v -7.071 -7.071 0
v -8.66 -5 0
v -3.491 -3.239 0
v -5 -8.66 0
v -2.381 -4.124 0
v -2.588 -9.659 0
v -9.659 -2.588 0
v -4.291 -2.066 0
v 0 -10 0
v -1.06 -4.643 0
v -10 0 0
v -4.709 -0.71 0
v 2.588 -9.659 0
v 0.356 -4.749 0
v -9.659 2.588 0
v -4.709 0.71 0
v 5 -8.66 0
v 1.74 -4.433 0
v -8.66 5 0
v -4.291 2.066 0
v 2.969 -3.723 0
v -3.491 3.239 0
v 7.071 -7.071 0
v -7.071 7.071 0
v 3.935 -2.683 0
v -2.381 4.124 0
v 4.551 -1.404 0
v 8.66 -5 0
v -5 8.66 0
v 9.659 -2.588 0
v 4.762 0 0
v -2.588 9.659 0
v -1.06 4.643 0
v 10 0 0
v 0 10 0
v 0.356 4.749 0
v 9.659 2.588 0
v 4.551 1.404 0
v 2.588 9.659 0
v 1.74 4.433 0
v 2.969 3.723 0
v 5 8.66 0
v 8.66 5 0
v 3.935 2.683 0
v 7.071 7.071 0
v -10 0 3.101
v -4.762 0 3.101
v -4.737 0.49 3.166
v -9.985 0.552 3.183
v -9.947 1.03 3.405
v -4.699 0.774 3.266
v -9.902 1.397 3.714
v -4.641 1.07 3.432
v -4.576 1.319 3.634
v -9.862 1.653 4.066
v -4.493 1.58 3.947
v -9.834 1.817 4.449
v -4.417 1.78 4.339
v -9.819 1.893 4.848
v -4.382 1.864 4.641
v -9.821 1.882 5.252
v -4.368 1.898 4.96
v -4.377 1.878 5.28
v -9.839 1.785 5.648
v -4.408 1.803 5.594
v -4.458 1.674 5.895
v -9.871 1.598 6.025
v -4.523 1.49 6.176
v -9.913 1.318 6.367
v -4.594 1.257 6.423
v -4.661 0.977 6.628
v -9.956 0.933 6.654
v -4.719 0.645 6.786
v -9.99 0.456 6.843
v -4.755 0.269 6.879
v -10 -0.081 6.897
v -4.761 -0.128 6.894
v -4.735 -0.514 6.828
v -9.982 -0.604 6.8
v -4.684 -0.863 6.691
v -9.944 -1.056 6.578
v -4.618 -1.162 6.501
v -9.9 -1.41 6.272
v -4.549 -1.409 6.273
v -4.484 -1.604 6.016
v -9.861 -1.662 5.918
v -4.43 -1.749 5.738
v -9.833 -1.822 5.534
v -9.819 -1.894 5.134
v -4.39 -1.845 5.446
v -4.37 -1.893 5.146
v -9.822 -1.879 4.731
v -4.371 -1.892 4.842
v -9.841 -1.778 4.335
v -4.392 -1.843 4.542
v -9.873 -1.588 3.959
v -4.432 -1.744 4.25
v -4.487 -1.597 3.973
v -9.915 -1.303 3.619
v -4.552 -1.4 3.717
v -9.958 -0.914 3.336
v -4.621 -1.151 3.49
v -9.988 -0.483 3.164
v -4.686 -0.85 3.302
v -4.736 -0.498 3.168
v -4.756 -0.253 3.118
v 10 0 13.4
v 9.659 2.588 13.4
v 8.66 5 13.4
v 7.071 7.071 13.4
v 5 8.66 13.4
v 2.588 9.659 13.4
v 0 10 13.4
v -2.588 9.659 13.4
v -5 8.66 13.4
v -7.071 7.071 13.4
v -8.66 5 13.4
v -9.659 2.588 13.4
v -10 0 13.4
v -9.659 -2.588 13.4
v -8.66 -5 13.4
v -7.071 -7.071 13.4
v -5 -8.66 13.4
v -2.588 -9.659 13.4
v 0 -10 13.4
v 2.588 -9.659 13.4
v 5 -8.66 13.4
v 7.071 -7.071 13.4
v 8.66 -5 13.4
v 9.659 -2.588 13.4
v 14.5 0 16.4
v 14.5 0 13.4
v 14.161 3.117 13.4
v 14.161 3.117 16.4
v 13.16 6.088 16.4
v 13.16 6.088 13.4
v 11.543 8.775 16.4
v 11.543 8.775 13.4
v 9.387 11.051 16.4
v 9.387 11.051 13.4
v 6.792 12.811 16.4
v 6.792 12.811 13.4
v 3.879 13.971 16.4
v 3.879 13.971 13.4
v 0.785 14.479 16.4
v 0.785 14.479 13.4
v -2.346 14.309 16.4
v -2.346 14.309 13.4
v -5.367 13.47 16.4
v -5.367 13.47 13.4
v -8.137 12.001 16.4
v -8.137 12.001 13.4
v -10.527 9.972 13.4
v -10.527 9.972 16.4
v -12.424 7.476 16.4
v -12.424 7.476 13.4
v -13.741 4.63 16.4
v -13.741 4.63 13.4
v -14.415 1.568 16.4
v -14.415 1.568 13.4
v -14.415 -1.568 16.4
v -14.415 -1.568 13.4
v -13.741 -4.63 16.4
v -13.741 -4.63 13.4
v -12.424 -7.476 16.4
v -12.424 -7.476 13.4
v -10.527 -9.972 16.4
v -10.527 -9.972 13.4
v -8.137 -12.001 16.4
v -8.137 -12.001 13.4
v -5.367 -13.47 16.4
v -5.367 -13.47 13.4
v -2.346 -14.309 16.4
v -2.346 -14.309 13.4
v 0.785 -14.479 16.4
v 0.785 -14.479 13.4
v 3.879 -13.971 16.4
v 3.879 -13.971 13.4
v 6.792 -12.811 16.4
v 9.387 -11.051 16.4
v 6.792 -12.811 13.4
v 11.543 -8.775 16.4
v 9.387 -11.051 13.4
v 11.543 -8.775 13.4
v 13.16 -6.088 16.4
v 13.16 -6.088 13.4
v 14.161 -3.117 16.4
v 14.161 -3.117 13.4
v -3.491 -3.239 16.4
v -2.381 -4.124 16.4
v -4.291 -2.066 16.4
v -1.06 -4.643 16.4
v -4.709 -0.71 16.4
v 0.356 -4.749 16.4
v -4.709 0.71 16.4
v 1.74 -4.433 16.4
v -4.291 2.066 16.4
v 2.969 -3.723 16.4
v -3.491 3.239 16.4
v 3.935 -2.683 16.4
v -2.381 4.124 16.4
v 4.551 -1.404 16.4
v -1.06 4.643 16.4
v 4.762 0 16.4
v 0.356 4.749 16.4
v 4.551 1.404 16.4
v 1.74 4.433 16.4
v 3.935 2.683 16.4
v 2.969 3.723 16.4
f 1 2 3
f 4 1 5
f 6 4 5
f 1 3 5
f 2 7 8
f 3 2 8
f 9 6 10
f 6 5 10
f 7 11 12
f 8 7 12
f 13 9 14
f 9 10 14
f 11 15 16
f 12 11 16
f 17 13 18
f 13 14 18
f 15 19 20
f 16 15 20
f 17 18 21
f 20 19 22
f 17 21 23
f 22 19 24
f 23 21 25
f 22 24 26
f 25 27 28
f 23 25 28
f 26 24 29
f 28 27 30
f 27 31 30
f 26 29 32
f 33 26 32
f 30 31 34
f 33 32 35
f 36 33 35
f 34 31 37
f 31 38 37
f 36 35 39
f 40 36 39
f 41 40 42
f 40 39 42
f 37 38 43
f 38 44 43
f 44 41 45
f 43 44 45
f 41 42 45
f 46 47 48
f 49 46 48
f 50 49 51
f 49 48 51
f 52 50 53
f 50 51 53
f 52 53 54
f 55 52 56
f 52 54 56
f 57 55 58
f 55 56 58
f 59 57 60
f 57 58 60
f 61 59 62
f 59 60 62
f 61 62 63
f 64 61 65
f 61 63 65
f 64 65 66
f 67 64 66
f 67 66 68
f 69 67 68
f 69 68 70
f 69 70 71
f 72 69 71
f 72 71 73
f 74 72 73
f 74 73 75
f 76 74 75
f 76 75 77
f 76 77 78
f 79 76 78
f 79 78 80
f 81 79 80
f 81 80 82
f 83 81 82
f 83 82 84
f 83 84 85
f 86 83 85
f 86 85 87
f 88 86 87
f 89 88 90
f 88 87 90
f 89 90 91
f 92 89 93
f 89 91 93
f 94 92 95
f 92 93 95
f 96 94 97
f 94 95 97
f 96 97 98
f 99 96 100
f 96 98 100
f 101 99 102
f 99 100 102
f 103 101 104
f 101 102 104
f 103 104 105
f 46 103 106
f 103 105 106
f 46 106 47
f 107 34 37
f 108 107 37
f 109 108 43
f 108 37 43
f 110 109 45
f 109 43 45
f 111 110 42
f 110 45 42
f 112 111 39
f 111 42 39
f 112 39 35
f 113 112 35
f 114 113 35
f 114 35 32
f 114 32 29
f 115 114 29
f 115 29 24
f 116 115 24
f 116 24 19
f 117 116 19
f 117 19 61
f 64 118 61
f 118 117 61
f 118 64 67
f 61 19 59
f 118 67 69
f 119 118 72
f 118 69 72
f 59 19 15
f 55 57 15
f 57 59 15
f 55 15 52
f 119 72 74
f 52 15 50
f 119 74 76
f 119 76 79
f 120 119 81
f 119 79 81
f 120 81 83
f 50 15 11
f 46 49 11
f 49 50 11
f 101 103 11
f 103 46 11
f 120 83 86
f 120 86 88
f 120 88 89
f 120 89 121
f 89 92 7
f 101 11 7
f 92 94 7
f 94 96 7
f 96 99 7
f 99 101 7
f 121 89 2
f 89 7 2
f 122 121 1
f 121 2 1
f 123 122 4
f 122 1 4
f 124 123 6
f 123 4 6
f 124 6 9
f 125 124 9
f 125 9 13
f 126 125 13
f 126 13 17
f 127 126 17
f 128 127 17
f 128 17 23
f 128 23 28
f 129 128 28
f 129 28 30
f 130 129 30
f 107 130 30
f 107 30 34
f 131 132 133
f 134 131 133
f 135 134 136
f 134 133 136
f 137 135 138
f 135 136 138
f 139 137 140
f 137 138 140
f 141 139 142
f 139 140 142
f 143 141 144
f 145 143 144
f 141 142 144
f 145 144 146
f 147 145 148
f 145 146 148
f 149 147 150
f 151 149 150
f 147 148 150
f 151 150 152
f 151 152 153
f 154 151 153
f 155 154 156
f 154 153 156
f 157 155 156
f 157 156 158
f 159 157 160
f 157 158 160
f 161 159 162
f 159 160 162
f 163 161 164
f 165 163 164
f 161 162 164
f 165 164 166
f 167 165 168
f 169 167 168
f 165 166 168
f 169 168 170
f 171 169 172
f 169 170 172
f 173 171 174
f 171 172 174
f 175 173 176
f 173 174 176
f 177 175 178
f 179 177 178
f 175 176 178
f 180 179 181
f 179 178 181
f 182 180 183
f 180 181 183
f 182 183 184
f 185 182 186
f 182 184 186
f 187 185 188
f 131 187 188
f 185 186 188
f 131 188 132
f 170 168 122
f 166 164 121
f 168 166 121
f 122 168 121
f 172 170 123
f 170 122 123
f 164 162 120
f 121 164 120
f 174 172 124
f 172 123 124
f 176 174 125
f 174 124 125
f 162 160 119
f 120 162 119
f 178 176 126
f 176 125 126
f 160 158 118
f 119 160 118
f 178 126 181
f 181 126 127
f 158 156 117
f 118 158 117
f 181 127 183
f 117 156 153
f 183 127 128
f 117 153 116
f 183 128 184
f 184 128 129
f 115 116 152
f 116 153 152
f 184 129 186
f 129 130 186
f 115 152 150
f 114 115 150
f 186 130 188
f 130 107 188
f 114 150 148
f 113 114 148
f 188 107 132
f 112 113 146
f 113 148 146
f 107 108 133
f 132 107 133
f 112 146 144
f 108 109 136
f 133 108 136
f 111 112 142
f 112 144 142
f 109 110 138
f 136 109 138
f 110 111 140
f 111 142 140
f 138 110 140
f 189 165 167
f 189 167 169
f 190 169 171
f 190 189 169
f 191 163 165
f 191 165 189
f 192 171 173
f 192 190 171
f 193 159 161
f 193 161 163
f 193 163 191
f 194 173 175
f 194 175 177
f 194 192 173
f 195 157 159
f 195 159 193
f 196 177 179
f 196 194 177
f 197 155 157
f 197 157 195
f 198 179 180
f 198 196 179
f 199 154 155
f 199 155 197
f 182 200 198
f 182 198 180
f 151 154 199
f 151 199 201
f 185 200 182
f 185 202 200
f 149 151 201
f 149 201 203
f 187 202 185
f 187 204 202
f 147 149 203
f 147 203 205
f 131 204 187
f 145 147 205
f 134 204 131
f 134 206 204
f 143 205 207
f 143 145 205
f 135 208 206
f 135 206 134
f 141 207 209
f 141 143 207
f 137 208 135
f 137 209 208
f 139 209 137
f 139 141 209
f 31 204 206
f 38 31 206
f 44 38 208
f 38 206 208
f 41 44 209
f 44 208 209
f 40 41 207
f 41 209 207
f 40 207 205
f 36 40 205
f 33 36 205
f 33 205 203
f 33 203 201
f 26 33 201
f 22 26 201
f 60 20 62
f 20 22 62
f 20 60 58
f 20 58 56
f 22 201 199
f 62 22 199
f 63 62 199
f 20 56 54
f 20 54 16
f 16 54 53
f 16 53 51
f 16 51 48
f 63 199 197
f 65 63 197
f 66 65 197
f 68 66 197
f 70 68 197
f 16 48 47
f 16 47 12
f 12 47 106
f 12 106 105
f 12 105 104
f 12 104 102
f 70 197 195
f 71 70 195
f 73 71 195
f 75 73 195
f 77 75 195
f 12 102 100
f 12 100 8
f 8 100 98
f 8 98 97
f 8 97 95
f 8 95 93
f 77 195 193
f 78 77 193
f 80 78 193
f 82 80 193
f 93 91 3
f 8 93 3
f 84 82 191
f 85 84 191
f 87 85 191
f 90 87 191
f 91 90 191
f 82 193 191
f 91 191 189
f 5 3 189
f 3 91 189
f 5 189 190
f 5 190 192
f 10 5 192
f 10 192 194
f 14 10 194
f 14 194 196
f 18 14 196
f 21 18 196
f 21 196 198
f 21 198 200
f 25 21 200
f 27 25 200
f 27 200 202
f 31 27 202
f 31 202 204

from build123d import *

# Parameters (mm, degrees)
SKETCH1_R               = 10
BOSS_EXTRUDE1_DEPTH     = 13.4
SKETCH2_R               = 14.5
BOSS_EXTRUDE2_DEPTH     = 3
SKETCH3_R               = 4.7625
CUT_EXTRUDE1_DEPTH      = 16.4
CUT_EXTRUDE2_REACH      = 28.258
CUT_EXTRUDE2_END_RADIUS = 10
SKETCH4_R               = 1.89865


with BuildPart() as part:
    # Sketch1 → Boss-Extrude1 (new body)
    with BuildSketch(Plane.XY):
        Circle(SKETCH1_R)
    extrude(amount=BOSS_EXTRUDE1_DEPTH)

    # Sketch2 → Boss-Extrude2 (add)
    with BuildSketch(Plane.XY.offset(13.4)):
        Circle(SKETCH2_R)
    extrude(amount=BOSS_EXTRUDE2_DEPTH)

    # Sketch3 → Cut-Extrude1 (cut)
    with BuildSketch(Plane.XY.offset(16.4)):
        Circle(SKETCH3_R)
    extrude(amount=-CUT_EXTRUDE1_DEPTH, mode=Mode.SUBTRACT)

    # Cut-Extrude2: up to this cylinder (the profile starts inside it)
    cut_extrude2_end = Plane(origin=(0, 0, 5), z_dir=(0, 0, -1)) * Cylinder(CUT_EXTRUDE2_END_RADIUS, 77.516, mode=Mode.PRIVATE)
    # Sketch4 → Cut-Extrude2 (cut, up to the surface)
    with BuildSketch(Plane(origin=(0, 0, 0), x_dir=(0, 0, -1), z_dir=(1, 0, 0)), mode=Mode.PRIVATE) as cut_extrude2_sk1:
        with Locations((-5, 0)):
            Circle(SKETCH4_R)
    cut_extrude2_tool1 = extrude(cut_extrude2_sk1.sketch, amount=-CUT_EXTRUDE2_REACH, mode=Mode.PRIVATE) & cut_extrude2_end
    add(cut_extrude2_tool1.solids().sort_by_distance((0, 0, 5))[0], mode=Mode.SUBTRACT)


solid = part.part
